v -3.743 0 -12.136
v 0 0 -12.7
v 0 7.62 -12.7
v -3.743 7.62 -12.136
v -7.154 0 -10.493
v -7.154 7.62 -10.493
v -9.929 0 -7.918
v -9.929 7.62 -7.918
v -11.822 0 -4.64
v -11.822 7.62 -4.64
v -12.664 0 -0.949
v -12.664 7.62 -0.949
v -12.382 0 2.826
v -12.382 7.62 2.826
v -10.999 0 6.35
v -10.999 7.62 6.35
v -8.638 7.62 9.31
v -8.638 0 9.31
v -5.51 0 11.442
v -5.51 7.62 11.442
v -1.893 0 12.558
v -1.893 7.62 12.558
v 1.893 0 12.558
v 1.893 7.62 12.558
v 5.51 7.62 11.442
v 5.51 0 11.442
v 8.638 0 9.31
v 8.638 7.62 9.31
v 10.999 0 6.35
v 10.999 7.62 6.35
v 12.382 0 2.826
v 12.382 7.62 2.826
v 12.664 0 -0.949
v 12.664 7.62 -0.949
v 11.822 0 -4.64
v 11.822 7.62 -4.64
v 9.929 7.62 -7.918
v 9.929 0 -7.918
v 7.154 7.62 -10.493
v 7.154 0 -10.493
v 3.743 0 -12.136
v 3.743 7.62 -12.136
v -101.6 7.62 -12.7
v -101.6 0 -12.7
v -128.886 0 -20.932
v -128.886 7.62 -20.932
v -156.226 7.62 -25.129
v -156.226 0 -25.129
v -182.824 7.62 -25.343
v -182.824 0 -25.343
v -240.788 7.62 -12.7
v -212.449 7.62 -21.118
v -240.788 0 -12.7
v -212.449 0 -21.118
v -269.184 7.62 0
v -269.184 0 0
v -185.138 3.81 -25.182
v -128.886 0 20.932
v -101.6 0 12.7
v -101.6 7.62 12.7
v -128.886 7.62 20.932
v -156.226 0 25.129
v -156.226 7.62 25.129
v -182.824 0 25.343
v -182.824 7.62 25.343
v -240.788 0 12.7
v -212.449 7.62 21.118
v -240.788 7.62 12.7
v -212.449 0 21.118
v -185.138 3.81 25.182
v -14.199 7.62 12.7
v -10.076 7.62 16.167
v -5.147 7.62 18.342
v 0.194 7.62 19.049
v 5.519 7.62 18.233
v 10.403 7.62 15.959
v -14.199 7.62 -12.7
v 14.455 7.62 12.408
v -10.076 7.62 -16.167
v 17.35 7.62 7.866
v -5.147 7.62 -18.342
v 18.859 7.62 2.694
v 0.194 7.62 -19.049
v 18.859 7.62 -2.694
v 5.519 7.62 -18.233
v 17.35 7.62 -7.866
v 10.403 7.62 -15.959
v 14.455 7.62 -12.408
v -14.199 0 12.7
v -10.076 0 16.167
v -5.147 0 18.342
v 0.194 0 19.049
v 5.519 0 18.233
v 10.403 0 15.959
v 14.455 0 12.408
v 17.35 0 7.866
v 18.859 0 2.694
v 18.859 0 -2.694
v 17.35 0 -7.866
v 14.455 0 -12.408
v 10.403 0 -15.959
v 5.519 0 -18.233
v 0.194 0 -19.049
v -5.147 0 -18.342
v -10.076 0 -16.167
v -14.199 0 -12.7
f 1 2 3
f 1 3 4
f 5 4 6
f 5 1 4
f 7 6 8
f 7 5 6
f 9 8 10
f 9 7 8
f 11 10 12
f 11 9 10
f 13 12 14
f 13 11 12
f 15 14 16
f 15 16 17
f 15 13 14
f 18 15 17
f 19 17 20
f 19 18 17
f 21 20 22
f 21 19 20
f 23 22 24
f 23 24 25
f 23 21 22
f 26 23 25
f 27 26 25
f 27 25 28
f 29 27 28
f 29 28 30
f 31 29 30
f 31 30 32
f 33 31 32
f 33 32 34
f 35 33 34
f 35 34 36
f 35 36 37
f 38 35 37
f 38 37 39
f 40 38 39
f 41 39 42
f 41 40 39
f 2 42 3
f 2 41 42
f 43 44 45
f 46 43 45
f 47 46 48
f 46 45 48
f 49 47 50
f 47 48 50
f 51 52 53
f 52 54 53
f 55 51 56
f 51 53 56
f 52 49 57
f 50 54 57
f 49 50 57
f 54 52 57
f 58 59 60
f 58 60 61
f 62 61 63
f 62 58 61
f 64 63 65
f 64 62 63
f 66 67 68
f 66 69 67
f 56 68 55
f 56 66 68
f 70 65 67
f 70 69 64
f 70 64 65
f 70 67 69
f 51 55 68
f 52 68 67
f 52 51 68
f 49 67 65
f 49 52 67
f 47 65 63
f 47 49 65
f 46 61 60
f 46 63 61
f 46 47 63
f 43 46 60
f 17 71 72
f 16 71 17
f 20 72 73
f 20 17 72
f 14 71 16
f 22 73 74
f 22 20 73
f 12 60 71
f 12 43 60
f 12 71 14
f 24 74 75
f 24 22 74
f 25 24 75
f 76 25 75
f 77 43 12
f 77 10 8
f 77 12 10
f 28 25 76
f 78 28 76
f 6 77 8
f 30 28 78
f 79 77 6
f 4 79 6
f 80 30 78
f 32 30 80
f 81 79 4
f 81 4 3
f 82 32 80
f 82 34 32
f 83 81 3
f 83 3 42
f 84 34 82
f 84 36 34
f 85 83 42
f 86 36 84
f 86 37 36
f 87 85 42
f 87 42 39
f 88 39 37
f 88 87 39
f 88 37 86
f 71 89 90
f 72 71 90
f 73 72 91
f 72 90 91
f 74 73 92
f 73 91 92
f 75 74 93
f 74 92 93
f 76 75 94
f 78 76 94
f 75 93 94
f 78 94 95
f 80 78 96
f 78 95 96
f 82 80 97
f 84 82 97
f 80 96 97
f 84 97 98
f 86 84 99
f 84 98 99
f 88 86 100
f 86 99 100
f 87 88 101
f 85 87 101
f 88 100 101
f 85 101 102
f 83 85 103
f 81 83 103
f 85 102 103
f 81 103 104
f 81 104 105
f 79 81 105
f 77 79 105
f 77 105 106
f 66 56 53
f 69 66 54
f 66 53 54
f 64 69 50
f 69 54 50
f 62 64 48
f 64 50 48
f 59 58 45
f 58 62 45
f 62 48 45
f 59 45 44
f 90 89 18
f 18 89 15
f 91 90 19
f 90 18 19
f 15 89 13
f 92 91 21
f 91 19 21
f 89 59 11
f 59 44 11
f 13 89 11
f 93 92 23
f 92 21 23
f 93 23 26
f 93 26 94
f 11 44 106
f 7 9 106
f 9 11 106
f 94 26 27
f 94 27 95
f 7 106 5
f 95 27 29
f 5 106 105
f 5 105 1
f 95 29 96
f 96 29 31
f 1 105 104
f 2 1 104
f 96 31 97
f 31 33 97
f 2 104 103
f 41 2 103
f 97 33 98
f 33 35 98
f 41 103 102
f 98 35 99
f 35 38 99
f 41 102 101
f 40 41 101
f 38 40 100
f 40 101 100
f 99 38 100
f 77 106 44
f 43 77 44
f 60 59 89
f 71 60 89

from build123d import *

# Parameters (mm, degrees)
SKETCH1_R           = 12.7
BOSS_EXTRUDE1_DEPTH = 7.62


with BuildPart() as part:
    # Sketch1 → Boss-Extrude1 (new body)
    with BuildSketch(Plane(origin=(0, 0, 0), x_dir=(1, 0, 0), z_dir=(0, 1, 0))):
        with BuildLine():
            Line((-14.199031657, 12.7), (-101.6, 12.7))
            add(Edge.make_bspline(
                [(-101.6, 12.7), (-184.883349987, 44.014741237), (-269.184277242, 0)],
                knots=[0, 0, 0, 1, 1, 1], degree=2))
            add(Edge.make_bspline(
                [(-101.6, -12.7), (-184.883349987, -44.014741237), (-269.184277242, 0)],
                knots=[0, 0, 0, 1, 1, 1], degree=2))
            Line((-101.6, -12.7), (-14.199031657, -12.7))
            ThreePointArc((-14.199031657, -12.7), (19.05, 0), (-14.199031657, 12.7))
        make_face()
        with Locations(Location((0, 0, 0), (0, 0, 90))):
            Circle(SKETCH1_R, mode=Mode.SUBTRACT)
    extrude(amount=BOSS_EXTRUDE1_DEPTH)


solid = part.part
